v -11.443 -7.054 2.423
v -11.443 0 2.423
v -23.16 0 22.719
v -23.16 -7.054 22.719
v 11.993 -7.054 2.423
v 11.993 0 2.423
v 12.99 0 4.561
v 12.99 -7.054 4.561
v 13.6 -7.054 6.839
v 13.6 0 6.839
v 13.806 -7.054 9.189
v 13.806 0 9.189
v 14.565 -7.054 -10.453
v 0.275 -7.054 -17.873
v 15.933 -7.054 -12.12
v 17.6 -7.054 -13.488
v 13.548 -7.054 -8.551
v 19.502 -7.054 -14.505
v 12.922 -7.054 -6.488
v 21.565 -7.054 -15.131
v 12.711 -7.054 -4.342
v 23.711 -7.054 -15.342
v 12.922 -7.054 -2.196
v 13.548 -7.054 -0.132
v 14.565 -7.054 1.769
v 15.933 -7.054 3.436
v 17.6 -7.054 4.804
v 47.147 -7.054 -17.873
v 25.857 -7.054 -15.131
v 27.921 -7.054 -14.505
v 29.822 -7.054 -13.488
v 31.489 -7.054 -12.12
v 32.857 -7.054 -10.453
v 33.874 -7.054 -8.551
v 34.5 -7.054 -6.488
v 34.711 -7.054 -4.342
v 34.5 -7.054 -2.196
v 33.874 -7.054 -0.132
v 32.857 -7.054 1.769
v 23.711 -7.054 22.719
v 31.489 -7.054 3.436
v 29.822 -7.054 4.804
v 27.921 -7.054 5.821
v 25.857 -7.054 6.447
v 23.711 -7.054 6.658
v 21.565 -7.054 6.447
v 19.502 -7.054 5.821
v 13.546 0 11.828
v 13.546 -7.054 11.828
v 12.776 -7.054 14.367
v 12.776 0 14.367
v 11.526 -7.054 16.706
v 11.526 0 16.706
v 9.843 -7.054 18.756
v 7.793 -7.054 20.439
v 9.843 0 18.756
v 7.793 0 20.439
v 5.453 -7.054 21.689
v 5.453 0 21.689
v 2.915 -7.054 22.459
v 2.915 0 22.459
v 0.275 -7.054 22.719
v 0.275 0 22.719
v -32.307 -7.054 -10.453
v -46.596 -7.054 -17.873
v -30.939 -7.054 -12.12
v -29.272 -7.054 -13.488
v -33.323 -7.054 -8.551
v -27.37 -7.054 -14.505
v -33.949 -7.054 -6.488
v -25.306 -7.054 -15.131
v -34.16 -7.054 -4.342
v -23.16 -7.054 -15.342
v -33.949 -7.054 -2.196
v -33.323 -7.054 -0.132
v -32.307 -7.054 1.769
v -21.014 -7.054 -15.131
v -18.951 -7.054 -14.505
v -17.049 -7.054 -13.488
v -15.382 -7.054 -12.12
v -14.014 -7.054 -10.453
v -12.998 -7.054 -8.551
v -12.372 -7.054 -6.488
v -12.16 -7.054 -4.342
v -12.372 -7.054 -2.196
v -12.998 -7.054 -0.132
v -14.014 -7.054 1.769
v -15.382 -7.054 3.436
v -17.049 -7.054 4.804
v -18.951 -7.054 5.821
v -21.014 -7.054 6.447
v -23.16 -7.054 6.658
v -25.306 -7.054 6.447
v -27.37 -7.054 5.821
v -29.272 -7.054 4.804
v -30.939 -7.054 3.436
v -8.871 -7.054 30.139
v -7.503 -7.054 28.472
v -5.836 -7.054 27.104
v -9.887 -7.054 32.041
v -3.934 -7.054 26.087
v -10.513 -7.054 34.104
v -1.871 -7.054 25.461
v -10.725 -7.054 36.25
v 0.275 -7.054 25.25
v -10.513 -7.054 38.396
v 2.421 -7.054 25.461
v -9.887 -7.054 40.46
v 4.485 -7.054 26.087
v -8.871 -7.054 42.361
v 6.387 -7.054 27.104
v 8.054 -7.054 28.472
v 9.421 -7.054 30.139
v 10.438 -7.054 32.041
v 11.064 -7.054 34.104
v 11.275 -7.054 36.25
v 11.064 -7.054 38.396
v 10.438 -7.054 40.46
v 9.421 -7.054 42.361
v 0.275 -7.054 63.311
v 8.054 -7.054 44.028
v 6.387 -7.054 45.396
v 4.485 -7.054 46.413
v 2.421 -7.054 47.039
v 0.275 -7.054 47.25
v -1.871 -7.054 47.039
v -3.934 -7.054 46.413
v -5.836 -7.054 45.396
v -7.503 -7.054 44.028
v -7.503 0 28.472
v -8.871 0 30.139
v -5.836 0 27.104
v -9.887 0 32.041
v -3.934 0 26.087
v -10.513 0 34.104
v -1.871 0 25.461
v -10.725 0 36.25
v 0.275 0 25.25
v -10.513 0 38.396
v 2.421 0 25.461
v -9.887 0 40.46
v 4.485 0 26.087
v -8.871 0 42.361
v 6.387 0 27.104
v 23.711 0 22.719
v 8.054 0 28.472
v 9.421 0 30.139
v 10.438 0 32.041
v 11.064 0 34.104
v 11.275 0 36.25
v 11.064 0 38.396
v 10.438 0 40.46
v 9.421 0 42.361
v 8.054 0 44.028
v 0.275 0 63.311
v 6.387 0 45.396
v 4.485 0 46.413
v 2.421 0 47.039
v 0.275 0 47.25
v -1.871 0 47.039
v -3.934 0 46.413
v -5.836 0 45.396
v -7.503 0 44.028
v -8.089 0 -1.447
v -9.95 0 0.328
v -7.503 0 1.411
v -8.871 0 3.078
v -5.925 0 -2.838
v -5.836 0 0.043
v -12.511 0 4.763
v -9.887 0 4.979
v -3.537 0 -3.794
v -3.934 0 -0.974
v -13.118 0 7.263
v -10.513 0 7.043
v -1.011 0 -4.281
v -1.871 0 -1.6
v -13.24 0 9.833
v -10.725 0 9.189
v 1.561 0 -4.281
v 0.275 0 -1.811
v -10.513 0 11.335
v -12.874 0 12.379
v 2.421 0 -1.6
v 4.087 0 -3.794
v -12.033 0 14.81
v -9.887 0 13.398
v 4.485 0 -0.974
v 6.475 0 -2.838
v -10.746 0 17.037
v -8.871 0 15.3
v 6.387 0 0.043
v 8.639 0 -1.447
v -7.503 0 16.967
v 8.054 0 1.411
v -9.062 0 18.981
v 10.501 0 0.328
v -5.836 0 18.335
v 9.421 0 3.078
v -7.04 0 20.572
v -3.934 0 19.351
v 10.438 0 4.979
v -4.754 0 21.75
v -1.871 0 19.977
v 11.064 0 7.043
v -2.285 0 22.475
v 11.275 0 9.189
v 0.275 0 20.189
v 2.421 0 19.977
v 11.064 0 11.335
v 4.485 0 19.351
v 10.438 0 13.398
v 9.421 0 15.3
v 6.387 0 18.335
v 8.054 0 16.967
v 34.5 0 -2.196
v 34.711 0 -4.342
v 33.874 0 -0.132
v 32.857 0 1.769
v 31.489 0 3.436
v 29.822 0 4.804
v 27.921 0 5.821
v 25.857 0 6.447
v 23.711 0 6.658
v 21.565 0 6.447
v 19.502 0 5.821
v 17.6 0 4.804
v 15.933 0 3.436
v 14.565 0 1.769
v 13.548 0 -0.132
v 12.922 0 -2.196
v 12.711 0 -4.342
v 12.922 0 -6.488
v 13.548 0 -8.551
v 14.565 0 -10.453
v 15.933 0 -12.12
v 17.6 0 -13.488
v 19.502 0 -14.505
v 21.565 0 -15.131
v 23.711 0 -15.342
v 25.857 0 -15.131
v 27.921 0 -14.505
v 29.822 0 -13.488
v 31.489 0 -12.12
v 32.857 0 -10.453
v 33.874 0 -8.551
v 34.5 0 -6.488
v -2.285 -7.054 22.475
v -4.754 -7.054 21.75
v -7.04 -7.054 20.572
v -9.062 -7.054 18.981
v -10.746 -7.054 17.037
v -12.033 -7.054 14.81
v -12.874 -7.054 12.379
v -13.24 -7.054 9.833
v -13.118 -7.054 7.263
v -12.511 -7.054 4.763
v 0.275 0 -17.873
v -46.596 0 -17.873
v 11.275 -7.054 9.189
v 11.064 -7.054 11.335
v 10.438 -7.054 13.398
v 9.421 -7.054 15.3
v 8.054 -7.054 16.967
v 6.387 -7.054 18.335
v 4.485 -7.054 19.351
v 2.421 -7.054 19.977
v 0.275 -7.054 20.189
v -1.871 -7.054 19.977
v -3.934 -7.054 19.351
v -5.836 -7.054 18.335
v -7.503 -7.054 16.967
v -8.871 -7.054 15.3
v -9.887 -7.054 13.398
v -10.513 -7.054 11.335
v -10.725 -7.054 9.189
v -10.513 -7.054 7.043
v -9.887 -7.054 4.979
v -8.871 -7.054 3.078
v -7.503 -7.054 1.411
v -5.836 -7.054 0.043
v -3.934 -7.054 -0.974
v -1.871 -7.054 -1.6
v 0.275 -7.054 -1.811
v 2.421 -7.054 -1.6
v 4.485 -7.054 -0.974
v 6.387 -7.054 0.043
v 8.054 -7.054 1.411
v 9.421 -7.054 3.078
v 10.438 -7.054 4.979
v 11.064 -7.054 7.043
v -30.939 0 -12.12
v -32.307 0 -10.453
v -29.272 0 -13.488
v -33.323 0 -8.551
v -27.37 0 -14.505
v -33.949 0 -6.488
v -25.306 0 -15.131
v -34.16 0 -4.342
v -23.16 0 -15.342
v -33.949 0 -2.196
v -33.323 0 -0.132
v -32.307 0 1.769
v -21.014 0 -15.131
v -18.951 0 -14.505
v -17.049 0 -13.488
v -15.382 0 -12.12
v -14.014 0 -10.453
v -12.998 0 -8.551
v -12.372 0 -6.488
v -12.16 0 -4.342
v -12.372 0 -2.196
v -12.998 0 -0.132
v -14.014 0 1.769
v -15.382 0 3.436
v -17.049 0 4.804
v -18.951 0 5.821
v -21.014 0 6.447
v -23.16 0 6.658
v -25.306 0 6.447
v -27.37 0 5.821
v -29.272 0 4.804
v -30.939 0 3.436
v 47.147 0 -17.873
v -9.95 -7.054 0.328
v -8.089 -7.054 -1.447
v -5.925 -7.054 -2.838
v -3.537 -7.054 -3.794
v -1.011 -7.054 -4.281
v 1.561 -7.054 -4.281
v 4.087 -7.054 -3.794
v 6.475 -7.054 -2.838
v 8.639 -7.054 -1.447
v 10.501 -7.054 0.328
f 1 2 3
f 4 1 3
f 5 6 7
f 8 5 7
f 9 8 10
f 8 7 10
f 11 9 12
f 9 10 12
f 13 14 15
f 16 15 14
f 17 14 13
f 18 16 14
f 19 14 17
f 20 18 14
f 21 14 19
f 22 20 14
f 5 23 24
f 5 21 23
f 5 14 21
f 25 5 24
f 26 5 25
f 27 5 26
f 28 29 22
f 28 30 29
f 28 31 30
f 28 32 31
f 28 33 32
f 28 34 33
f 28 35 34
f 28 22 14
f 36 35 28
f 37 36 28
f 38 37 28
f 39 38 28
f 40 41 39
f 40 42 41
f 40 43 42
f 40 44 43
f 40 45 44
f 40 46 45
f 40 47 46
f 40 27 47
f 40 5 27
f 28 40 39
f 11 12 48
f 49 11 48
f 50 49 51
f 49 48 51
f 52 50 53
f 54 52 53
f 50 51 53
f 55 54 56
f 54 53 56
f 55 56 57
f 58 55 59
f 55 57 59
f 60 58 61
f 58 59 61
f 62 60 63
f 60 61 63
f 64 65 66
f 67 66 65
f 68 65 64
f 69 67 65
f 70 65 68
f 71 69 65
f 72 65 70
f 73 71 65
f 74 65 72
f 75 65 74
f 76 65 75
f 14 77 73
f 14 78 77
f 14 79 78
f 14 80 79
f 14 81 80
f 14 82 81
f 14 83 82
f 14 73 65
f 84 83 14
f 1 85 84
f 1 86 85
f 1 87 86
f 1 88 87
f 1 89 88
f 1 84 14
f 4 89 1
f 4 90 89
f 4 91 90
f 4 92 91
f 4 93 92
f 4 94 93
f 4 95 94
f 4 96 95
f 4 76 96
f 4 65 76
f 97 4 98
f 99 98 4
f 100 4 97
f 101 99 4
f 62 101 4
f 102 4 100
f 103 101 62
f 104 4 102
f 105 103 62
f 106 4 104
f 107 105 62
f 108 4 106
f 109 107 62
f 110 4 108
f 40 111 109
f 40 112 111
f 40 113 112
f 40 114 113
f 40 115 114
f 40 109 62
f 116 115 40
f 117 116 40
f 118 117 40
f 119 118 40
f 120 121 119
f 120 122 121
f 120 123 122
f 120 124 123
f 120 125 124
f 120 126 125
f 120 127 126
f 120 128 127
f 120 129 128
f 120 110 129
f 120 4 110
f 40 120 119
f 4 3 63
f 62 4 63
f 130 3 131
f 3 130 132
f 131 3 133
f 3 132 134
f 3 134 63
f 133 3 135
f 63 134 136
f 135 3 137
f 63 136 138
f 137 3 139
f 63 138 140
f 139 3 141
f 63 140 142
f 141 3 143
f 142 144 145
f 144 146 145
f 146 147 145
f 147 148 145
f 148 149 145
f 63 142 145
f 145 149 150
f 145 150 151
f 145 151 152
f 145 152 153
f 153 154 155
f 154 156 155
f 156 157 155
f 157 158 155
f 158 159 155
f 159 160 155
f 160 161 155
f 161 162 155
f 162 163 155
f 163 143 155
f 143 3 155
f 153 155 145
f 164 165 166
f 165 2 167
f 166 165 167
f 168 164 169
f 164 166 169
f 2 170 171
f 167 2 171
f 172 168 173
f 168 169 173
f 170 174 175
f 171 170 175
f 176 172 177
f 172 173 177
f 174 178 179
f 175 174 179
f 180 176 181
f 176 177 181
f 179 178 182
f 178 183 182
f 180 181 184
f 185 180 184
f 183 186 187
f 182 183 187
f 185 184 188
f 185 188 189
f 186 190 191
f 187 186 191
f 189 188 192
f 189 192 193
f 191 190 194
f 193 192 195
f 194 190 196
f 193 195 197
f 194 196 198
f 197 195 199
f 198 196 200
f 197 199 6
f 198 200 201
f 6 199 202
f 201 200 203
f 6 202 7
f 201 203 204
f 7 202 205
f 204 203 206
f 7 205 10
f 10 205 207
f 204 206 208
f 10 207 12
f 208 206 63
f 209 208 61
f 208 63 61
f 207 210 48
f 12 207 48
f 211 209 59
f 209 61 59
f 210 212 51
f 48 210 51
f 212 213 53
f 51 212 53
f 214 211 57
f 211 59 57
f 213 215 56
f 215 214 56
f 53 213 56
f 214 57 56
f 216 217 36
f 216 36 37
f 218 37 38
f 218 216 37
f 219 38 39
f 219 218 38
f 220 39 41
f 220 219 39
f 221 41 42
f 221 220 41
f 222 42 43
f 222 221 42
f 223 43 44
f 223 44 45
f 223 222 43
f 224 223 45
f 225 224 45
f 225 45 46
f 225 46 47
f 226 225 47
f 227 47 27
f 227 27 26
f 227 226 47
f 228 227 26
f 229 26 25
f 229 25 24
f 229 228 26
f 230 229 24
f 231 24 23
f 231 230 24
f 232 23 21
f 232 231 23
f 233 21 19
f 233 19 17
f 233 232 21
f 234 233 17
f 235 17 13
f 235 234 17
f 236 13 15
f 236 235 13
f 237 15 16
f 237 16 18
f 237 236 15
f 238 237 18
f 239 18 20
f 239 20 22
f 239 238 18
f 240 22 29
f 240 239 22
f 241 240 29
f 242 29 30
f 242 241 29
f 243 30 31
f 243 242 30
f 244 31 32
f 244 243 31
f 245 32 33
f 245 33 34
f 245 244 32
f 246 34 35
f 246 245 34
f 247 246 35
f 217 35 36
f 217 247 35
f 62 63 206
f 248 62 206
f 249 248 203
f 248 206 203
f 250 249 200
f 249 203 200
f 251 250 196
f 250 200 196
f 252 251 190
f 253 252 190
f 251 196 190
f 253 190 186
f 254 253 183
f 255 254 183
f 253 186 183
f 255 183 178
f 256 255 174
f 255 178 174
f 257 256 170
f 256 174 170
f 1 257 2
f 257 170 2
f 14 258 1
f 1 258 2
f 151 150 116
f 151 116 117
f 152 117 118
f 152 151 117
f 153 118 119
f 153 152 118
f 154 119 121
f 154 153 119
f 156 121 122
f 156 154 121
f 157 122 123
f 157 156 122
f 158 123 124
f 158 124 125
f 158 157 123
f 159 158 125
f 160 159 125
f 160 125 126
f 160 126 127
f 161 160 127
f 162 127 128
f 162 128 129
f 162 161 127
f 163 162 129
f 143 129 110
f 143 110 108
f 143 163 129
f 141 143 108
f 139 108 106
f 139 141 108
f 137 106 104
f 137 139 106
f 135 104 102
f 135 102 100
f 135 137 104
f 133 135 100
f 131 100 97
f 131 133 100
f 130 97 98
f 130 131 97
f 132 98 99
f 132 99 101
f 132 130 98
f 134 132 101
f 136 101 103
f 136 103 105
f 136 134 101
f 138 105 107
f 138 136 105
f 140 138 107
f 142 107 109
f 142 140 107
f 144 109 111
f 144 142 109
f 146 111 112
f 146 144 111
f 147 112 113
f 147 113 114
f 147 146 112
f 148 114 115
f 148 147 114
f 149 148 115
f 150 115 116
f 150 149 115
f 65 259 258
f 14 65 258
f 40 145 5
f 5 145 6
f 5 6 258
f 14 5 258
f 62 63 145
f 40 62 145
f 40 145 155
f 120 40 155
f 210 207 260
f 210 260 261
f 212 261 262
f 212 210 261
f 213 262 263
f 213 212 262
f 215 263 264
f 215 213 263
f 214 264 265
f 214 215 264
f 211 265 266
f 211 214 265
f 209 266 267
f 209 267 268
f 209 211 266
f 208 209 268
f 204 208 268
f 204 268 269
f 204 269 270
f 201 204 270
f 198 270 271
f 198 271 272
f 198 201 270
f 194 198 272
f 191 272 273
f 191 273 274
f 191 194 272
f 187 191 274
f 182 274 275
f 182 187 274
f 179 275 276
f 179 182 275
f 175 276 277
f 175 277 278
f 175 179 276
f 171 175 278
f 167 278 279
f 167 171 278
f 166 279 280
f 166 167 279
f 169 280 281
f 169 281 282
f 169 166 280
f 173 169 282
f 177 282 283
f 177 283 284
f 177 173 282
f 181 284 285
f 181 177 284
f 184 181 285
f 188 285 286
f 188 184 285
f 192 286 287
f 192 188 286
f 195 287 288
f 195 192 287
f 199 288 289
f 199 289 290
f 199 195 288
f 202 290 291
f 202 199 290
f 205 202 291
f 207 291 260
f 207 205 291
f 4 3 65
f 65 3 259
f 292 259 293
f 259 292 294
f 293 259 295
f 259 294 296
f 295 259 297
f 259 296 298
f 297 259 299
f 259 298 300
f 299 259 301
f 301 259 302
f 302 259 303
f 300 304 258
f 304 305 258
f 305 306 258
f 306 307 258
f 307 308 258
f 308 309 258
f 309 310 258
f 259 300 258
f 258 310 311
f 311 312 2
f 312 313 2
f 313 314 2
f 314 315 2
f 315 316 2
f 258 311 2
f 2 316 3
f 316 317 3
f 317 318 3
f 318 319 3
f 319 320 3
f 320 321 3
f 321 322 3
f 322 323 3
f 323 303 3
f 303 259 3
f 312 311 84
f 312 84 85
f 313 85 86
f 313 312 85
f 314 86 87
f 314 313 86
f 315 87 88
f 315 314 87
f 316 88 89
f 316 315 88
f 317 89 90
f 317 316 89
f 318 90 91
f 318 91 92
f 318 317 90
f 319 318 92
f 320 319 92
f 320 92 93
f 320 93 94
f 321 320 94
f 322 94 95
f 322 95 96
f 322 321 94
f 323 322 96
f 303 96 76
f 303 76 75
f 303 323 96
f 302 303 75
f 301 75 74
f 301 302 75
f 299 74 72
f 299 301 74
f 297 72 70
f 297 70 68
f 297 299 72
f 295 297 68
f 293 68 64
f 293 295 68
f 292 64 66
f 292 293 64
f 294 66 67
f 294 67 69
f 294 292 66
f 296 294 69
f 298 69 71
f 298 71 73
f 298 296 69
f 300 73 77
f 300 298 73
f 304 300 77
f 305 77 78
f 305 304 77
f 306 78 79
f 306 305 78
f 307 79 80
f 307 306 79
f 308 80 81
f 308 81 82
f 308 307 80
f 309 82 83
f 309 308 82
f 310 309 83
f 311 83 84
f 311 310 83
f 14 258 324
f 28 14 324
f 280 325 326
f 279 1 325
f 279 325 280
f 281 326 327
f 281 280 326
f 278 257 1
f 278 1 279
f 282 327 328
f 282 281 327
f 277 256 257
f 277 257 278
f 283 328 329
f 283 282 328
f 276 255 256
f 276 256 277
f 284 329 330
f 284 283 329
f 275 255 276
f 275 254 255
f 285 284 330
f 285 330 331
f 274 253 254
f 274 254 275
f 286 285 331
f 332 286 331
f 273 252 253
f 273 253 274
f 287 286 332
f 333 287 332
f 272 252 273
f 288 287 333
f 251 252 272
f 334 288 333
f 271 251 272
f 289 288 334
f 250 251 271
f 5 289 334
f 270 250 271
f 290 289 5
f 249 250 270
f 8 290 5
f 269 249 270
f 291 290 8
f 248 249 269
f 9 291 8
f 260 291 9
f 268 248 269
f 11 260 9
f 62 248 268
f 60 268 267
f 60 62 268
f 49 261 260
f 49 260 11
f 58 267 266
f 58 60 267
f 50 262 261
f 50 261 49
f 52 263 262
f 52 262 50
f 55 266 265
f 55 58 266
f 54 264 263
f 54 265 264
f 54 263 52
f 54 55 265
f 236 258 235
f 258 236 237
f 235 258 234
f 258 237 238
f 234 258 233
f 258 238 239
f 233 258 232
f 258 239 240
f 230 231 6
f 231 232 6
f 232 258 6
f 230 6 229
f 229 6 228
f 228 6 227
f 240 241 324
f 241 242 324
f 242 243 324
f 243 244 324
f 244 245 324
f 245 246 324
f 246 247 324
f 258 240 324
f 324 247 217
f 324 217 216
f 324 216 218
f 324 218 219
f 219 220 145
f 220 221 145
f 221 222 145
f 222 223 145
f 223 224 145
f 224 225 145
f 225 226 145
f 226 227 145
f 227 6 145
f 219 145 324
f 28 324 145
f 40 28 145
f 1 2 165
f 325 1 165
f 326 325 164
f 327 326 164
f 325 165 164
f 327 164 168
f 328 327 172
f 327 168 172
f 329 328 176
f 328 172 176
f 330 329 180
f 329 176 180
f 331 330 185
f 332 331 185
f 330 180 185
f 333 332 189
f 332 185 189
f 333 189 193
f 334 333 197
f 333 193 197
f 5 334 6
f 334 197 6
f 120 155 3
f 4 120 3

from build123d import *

# Parameters (mm, degrees)
F0_R     = 11
F1_DEPTH = 7.054


with BuildPart() as f1:
    # F0 (on Front) → F1 (new body)
    with BuildSketch(Plane.XZ):
        Polygon((0.275328, 63.311441), (-23.160463, 22.719459), (0.275328, 22.719459), (23.71112, 22.719459), align=None)
        with Locations((0.275328, 36.250119)):
            Circle(F0_R, mode=Mode.SUBTRACT)
        Polygon((-11.442567, 2.423468), (-23.160463, 22.719459), (-46.596255, -17.872524), (-23.160463, -17.872524), (0.275328, -17.872524), align=None)
        with Locations((-23.160463, -4.341863)):
            Circle(F0_R, mode=Mode.SUBTRACT)
        with BuildLine():
            ThreePointArc((0.275328, 22.719459), (-11.442567, 15.954128), (-11.442567, 2.423468))
            ThreePointArc((-11.442567, 2.423468), (0.275328, -4.341863), (11.993224, 2.423467))
            ThreePointArc((11.993224, 2.423467), (13.344943, 5.686805), (13.805989, 9.188798))
            ThreePointArc((13.805989, 9.188798), (9.84295, 18.75642), (0.275328, 22.719459))
        make_face()
        with Locations((0.275328, 9.188798)):
            Circle(F0_R, mode=Mode.SUBTRACT)
        Polygon((11.993224, 2.423467), (0.275328, -17.872524), (47.146912, -17.872524), (23.71112, 22.719459), align=None)
        with Locations((23.71112, -4.341863)):
            Circle(F0_R, mode=Mode.SUBTRACT)
    extrude(amount=F1_DEPTH)


solid = f1.part
